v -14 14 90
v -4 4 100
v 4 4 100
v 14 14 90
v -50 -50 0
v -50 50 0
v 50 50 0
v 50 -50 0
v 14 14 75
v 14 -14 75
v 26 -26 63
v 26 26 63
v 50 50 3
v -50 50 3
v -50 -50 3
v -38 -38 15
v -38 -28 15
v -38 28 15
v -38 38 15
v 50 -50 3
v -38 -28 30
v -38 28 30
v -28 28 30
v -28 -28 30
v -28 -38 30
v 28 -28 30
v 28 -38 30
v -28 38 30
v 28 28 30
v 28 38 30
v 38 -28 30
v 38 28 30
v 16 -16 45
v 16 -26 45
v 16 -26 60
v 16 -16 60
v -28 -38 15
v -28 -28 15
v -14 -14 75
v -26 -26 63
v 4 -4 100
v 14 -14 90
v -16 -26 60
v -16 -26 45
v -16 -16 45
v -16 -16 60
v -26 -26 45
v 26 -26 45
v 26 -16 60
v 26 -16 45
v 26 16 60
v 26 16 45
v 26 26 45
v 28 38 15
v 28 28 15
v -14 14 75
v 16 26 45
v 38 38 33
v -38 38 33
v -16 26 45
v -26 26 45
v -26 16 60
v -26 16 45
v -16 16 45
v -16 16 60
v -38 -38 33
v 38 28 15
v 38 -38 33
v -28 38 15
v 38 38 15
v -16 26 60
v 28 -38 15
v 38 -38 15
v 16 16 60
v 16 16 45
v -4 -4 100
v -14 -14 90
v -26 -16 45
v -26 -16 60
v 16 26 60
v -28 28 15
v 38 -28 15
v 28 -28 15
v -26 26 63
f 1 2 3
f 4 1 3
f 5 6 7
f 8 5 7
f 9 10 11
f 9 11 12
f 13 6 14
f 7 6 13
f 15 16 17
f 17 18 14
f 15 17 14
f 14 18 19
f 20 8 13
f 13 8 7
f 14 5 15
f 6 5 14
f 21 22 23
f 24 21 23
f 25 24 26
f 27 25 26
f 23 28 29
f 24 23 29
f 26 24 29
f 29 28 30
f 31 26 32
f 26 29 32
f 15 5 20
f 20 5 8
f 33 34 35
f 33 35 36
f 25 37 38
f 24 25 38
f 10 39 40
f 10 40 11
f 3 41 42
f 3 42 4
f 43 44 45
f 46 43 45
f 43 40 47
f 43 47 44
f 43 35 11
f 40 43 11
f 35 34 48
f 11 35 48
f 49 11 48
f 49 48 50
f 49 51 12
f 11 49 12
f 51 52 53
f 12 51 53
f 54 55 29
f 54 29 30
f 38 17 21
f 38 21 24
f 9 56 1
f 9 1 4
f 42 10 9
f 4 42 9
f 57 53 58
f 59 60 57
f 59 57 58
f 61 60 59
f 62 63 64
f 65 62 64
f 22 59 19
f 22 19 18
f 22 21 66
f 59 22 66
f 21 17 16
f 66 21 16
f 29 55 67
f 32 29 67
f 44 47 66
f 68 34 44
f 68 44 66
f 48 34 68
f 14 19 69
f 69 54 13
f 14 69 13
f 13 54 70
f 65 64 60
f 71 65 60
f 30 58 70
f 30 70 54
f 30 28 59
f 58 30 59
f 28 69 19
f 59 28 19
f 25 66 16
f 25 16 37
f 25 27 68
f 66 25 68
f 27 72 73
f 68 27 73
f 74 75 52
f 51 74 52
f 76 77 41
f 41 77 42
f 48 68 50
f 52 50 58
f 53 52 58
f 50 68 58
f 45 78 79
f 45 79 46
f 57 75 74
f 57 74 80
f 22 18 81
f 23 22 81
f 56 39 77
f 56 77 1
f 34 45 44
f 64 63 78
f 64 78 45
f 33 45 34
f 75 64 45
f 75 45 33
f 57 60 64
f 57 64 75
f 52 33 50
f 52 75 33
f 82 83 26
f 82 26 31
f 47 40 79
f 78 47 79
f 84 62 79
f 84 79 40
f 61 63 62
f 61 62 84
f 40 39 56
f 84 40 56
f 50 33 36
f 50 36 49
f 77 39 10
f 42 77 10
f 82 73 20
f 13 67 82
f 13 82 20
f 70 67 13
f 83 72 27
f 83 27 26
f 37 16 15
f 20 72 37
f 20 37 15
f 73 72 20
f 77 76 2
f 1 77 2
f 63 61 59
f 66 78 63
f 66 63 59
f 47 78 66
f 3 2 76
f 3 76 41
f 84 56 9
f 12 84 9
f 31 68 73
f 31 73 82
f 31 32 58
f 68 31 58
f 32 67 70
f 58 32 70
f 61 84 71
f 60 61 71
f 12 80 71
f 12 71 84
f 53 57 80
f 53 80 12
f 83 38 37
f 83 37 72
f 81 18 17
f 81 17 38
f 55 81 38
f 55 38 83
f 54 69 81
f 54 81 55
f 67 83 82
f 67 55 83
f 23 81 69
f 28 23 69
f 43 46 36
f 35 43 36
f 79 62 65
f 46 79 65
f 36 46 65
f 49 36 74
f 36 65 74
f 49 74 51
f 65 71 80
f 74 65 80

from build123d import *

# Parameters (mm, degrees)
F0_W      = 100
F0_H      = 100
F1_DEPTH  = 15
F2_SIZE   = 12
F3_W      = 10
F3_H      = 10
F4_DEPTH  = 15
F5_W      = 10
F5_H      = 10
F6_DEPTH  = 15
F7_SIZE   = 12
F8_W      = 10
F8_H      = 10
F9_DEPTH  = 15
F10_W     = 52
F10_H     = 52
F11_DEPTH = 15
F12_SIZE  = 12
F13_DEPTH = 25
F14_SIZE  = 10


with BuildPart() as f1:
    # F0 (on Top) → F1 (new body)
    with BuildSketch(Plane.XY):
        Rectangle(F0_W, F0_H)
    extrude(amount=F1_DEPTH)

    # F2
    f2_edges = [f1.edges().sort_by_distance(p)[0] for p in [
        (0, 50, 15),
        (-50, 0, 15),
        (0, -50, 15),
        (50, 0, 15),
    ]]
    chamfer(f2_edges, length=F2_SIZE)

    # F3 (on face) → F4 (join)
    with BuildSketch(Plane.XY.offset(15)):
        with Locations((-33, 33)):
            Rectangle(F3_W, F3_H)
        with Locations((33, 33)):
            Rectangle(F3_W, F3_H)
        with Locations((33, -33)):
            Rectangle(F3_W, F3_H)
        with Locations((-33, -33)):
            Rectangle(F3_W, F3_H)
    extrude(amount=F4_DEPTH)

    # F5 (on face) → F6 (join)
    with BuildSketch(Plane.XY.offset(30)):
        Polygon((38, 38), (-28, 38), (-28, 28), (-38, 28), (-38, -38), (38, -38), align=None)
        with Locations((-33, 33)):
            Rectangle(F5_W, F5_H)
    extrude(amount=F6_DEPTH)

    # F7
    f7_edges = [f1.edges().sort_by_distance(p)[0] for p in [
        (0, 38, 45),
        (-38, 0, 45),
        (0, -38, 45),
        (38, 0, 45),
    ]]
    chamfer(f7_edges, length=F7_SIZE)

    # F8 (on face) → F9 (join)
    with BuildSketch(Plane.XY.offset(45)):
        with Locations((-21, 21)):
            Rectangle(F8_W, F8_H)
        with Locations((21, 21)):
            Rectangle(F8_W, F8_H)
        with Locations((21, -21)):
            Rectangle(F8_W, F8_H)
        with Locations((-21, -21)):
            Rectangle(F8_W, F8_H)
    extrude(amount=F9_DEPTH)

    # F10 (on face) → F11 (join)
    with BuildSketch(Plane.XY.offset(60)):
        Rectangle(F10_W, F10_H)
    extrude(amount=F11_DEPTH)

    # F12
    f12_edges = [f1.edges().sort_by_distance(p)[0] for p in [
        (0, 26, 75),
        (-26, 0, 75),
        (0, -26, 75),
        (26, 0, 75),
    ]]
    chamfer(f12_edges, length=F12_SIZE)

    # F13 (add): a face of the model
    f13_faces = [f1.faces().sort_by_distance(p)[0] for p in [
        (0, 0, 75),
    ]]
    extrude(f13_faces, amount=F13_DEPTH)

    # F14
    f14_edges = [f1.edges().sort_by_distance(p)[0] for p in [
        (0, 14, 100),
        (14, 0, 100),
        (-14, 0, 100),
        (0, -14, 100),
    ]]
    chamfer(f14_edges, length=F14_SIZE)


solid = f1.part
